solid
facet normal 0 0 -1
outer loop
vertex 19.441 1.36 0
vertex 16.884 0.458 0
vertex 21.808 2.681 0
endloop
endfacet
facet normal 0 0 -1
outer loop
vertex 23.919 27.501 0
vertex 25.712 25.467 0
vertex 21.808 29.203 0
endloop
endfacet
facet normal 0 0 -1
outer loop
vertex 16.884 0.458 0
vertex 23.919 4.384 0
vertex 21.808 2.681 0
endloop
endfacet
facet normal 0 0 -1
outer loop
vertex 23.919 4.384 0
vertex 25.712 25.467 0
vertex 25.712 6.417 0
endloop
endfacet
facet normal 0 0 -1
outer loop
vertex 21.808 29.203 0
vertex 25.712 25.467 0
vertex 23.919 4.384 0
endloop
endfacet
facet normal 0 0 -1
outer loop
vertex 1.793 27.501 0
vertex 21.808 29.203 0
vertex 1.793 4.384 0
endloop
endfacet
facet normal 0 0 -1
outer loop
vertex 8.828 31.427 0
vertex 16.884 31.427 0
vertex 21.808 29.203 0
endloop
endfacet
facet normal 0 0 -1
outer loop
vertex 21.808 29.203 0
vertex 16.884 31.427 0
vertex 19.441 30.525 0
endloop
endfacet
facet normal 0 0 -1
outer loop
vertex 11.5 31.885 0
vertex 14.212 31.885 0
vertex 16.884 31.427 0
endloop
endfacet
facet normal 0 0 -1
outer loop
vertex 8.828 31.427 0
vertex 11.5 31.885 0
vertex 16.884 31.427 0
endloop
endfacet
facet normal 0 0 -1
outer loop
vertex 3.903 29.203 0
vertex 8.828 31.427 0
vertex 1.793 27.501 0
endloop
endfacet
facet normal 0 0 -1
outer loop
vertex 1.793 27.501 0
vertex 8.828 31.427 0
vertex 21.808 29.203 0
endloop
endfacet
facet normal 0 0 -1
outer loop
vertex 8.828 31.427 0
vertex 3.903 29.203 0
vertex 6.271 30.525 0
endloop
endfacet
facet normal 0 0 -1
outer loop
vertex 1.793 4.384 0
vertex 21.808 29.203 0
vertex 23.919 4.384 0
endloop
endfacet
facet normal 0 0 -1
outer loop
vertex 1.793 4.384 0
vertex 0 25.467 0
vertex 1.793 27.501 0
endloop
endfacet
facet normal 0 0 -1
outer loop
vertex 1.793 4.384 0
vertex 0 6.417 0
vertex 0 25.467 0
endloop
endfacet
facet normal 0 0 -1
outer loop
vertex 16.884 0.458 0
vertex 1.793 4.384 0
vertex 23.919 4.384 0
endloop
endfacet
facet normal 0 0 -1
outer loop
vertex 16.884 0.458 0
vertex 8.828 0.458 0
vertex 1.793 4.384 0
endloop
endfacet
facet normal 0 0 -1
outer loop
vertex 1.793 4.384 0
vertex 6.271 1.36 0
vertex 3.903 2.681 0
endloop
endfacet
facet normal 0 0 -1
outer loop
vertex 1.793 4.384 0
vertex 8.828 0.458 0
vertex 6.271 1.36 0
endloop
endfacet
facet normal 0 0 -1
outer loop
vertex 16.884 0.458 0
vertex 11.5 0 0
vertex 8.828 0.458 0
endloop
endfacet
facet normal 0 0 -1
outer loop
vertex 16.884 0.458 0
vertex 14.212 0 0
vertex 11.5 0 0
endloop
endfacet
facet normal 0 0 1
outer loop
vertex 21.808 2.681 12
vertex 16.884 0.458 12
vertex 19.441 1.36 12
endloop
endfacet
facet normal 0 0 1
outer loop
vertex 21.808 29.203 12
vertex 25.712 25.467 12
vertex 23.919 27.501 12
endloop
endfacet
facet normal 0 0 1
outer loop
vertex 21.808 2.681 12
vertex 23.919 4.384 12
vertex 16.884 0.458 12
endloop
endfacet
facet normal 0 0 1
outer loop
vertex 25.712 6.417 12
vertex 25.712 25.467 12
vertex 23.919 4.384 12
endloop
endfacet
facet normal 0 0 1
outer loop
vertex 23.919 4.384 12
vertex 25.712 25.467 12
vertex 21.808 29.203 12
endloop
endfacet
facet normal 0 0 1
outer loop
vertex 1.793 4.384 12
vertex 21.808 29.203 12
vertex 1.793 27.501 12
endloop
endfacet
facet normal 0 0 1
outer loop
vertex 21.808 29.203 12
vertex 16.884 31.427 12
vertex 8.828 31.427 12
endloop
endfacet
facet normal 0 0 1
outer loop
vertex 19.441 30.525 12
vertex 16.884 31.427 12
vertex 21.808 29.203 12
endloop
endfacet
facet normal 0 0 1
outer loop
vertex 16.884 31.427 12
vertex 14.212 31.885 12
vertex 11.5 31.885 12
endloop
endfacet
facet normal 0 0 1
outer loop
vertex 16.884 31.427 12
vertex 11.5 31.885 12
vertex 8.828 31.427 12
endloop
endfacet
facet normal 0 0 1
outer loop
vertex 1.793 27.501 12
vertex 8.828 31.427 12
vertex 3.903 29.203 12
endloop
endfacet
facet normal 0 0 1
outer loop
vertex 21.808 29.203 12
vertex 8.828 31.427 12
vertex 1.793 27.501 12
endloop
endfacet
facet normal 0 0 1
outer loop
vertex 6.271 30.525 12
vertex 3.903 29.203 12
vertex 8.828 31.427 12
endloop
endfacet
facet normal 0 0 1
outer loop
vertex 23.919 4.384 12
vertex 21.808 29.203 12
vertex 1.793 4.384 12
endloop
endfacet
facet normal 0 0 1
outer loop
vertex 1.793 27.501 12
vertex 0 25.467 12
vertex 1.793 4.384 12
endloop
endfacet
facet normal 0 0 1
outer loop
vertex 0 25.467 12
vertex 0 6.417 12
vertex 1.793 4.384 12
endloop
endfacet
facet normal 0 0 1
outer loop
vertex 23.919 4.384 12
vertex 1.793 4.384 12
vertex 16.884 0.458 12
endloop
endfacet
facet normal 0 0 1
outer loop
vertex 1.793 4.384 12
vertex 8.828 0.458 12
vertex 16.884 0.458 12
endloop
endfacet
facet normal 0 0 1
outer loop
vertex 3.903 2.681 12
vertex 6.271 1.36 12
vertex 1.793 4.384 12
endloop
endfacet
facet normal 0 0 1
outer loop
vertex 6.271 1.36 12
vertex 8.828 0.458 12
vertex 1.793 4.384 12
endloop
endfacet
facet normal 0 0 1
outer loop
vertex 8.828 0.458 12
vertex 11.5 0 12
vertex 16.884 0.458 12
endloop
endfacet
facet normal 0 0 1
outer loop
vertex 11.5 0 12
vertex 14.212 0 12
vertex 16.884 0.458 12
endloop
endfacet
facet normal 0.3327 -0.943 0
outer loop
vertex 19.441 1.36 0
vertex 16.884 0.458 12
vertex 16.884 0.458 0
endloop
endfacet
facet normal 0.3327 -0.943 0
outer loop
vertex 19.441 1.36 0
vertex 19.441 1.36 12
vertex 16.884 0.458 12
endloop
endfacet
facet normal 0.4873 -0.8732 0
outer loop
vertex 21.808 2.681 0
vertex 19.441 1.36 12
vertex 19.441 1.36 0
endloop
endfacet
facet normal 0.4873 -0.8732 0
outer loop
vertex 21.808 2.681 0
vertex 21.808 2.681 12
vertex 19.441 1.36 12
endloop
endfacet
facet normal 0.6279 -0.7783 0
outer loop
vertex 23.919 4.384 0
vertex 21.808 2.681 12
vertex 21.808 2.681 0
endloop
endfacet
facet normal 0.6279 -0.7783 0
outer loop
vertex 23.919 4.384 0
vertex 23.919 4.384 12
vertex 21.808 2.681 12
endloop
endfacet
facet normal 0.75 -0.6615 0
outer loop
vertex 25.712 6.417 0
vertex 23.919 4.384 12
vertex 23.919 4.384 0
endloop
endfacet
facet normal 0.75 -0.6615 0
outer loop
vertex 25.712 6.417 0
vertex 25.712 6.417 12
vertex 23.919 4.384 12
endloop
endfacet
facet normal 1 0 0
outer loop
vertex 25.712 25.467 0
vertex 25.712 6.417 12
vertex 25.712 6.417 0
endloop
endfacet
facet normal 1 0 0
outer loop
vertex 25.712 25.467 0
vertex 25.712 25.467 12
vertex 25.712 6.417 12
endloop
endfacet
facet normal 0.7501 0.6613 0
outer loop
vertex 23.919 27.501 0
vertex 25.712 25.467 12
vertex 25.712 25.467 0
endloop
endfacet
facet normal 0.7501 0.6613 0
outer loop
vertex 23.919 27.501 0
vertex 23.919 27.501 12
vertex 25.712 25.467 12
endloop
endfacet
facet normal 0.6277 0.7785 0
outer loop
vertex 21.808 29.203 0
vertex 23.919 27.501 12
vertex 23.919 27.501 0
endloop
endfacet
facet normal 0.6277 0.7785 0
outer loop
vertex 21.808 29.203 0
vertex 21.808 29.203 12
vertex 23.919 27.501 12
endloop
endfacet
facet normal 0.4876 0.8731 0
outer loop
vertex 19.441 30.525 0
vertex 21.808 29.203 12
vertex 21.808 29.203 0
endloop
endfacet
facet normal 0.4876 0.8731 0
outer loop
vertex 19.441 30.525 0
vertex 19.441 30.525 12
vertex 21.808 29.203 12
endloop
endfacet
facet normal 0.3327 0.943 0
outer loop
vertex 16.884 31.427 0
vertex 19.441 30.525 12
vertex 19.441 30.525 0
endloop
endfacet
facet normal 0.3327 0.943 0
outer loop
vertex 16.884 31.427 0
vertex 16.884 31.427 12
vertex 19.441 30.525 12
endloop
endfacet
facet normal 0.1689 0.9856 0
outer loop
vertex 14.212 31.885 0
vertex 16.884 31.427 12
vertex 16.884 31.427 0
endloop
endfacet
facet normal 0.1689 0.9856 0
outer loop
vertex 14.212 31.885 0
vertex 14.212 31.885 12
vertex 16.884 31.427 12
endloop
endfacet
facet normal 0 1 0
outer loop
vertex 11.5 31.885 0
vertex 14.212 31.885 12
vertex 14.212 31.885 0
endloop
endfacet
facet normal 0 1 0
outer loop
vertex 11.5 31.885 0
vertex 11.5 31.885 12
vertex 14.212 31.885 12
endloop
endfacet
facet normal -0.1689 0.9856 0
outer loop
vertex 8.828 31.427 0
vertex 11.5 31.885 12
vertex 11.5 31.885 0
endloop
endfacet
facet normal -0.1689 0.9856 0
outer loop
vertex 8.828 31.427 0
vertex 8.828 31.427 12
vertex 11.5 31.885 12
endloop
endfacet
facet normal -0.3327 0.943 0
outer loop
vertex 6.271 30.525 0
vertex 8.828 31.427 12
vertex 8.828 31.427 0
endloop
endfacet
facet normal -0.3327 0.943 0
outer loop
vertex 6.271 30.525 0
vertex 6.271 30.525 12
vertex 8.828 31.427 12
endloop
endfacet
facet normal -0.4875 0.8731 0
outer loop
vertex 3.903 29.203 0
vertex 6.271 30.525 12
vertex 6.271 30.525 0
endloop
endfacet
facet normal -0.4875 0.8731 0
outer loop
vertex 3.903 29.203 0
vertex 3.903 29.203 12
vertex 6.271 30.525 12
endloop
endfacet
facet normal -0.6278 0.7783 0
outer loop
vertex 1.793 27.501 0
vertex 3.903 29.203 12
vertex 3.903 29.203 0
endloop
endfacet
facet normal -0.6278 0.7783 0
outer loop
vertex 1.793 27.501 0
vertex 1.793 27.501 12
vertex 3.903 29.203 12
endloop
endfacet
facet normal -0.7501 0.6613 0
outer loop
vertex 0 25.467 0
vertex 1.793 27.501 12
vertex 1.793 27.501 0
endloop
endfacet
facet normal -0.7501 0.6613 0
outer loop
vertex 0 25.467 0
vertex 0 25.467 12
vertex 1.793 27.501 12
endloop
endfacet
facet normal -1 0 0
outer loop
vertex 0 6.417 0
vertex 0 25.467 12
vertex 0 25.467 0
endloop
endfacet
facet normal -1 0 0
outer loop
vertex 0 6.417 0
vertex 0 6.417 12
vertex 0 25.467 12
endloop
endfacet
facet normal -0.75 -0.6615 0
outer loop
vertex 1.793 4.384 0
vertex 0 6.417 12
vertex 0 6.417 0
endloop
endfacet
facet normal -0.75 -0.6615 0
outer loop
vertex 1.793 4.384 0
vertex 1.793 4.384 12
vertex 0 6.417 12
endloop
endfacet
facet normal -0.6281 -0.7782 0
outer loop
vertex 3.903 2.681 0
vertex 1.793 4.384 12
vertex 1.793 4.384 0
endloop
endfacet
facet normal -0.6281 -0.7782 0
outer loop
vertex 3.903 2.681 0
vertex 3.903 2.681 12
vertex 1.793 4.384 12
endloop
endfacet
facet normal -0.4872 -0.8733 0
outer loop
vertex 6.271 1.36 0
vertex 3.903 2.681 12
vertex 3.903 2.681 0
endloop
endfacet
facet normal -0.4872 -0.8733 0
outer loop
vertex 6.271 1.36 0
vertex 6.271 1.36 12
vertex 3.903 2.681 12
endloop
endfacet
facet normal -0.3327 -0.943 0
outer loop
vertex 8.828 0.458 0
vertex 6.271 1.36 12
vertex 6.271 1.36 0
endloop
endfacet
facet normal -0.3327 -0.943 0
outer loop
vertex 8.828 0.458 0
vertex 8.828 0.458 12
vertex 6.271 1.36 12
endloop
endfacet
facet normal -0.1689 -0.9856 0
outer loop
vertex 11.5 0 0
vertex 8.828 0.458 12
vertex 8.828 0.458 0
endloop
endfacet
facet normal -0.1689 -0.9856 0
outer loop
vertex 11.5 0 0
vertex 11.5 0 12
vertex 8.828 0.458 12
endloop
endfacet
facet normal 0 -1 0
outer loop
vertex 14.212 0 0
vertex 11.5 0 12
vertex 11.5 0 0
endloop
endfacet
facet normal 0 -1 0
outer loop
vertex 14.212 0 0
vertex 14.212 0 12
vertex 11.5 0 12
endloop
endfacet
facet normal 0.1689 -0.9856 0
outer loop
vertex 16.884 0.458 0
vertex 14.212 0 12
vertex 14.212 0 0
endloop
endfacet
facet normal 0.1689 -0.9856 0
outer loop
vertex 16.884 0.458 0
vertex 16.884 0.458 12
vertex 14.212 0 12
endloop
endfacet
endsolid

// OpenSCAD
$fn = 32;

// ----------------------------------------------------------------------
// Flat adaptor: double_d, 12 mm thick
// ----------------------------------------------------------------------

// --- parameters (mm) ---
profile_height = 12;      // extrusion height
profile_points = 24;      // points of the closed outline

profile = [[25.712, 25.467], [23.919, 27.501], [21.808, 29.203], [19.441, 30.525], [16.884, 31.427], [14.212, 31.885], [11.5, 31.885], [8.828, 31.427], [6.271, 30.525], [3.903, 29.203], [1.793, 27.501], [0, 25.467], [0, 6.417], [1.793, 4.384], [3.903, 2.681], [6.271, 1.36], [8.828, 0.458], [11.5, 0], [14.212, 0], [16.884, 0.458], [19.441, 1.36], [21.808, 2.681], [23.919, 4.384], [25.712, 6.417]];  // single closed polygon, 24 points, counter clockwise

// --- the one profile operation ---
linear_extrude(height = profile_height) polygon(points = profile);
